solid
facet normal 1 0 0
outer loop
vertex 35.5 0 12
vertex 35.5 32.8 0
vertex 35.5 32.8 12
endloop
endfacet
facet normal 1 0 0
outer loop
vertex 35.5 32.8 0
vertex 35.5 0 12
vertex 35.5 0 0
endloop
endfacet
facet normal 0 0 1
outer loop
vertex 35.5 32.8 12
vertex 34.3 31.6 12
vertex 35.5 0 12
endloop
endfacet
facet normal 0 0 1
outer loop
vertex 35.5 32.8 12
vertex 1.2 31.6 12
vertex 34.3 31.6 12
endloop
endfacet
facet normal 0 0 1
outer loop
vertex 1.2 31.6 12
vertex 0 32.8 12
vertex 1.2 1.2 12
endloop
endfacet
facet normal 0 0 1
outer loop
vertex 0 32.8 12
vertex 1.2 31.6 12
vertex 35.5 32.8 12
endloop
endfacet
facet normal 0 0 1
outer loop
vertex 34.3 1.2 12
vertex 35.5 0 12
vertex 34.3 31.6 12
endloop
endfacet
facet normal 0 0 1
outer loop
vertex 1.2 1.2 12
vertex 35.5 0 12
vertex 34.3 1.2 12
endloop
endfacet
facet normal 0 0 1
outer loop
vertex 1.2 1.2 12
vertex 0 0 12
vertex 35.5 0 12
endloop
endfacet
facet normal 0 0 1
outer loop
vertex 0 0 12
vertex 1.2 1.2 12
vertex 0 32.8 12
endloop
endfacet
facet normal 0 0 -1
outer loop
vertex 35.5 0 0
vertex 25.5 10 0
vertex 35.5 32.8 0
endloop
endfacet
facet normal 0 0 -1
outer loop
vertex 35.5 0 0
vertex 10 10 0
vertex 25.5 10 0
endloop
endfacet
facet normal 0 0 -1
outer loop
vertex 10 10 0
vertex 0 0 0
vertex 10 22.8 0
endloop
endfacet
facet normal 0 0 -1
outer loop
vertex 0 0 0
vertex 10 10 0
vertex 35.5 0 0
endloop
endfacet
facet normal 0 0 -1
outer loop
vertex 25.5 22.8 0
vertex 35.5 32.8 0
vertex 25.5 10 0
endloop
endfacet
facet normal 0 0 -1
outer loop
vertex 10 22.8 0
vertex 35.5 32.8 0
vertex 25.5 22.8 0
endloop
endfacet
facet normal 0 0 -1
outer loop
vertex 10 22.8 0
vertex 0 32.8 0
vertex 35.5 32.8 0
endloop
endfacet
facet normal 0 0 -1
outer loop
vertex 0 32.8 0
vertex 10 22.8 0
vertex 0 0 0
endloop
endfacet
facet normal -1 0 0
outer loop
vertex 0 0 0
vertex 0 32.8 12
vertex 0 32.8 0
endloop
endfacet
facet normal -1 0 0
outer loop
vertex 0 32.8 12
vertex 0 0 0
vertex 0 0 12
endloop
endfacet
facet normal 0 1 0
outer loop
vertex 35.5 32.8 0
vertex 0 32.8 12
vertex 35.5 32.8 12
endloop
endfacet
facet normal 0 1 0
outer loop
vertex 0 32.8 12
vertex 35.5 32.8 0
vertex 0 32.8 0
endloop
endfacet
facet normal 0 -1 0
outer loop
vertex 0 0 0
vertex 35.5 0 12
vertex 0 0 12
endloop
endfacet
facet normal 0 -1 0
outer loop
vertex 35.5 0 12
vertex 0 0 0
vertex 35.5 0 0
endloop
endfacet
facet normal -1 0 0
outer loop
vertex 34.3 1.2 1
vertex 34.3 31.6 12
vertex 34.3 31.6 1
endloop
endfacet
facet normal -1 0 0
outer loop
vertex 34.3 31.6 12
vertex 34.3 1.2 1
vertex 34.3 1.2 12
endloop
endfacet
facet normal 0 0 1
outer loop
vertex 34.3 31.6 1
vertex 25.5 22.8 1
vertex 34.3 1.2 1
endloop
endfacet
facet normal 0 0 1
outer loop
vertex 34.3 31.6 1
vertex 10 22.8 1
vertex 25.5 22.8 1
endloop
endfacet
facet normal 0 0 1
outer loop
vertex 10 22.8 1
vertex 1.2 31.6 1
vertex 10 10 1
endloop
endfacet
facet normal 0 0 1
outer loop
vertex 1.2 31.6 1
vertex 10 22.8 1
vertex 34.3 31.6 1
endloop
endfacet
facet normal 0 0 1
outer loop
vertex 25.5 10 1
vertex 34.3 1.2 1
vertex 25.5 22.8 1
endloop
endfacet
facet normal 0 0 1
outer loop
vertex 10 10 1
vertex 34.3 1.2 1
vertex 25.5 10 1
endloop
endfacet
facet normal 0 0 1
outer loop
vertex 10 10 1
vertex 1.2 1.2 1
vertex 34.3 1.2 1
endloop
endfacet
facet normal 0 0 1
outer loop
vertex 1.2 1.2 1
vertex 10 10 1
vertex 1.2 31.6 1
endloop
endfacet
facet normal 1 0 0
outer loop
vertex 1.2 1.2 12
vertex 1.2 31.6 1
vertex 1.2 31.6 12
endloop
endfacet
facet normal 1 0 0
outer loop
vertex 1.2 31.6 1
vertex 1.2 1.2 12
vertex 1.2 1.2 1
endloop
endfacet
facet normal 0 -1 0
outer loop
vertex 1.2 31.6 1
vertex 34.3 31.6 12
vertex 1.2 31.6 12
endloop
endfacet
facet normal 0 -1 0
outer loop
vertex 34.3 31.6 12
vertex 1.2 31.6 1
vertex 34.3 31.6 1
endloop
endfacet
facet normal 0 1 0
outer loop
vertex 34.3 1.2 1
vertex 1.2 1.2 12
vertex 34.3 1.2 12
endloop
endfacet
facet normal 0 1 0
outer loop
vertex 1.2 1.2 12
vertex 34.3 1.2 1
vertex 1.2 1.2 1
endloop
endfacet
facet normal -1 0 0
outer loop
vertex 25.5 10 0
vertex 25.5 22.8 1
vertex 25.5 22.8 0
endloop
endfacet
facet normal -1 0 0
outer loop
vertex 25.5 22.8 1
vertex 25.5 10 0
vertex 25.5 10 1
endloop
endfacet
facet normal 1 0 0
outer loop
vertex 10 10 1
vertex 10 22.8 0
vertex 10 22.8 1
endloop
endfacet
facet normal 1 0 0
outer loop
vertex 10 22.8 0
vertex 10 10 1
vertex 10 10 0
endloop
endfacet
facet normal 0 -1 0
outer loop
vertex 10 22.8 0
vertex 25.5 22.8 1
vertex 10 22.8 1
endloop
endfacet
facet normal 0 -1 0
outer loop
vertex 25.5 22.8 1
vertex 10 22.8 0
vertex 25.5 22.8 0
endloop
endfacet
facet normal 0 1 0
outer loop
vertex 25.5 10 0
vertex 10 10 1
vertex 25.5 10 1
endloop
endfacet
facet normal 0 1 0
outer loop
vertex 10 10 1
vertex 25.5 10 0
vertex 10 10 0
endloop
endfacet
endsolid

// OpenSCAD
// TestStand.scad -- Test Stand for Matias Key Switches

// Copyright © 2017, Mike Ady
// This file is part of the open source Stenokey project.
// This file is licensed under the Creative Commons Attribution-ShareAlike license.

$fn=100;

DimX=35.5;					// outside dimension
DimY=32.8;					// outside dimension
DimZ=12.0;					// outside dimension

CutoutX=15.5;				// 15.5 nominal per Matias prints
CutoutY=12.8;				// 12.8 nominal per Matias prints

KeyX=10.0;					// cutout offset, from outside left edge
KeyY=10.0;					// cutout offset, from outside bottom edge

FaceThickness=1.0;			// 1.1 nominal per Matias prints
WallThickness=1.2;

difference()
{
	cube([DimX,DimY,DimZ]);
	translate([WallThickness,WallThickness,FaceThickness])
		cube([DimX-2.0*WallThickness,DimY-2.0*WallThickness,DimZ]);
	
	translate([KeyX,KeyY,-FaceThickness])
		cube([CutoutX,CutoutY,3.0*FaceThickness]);
}
